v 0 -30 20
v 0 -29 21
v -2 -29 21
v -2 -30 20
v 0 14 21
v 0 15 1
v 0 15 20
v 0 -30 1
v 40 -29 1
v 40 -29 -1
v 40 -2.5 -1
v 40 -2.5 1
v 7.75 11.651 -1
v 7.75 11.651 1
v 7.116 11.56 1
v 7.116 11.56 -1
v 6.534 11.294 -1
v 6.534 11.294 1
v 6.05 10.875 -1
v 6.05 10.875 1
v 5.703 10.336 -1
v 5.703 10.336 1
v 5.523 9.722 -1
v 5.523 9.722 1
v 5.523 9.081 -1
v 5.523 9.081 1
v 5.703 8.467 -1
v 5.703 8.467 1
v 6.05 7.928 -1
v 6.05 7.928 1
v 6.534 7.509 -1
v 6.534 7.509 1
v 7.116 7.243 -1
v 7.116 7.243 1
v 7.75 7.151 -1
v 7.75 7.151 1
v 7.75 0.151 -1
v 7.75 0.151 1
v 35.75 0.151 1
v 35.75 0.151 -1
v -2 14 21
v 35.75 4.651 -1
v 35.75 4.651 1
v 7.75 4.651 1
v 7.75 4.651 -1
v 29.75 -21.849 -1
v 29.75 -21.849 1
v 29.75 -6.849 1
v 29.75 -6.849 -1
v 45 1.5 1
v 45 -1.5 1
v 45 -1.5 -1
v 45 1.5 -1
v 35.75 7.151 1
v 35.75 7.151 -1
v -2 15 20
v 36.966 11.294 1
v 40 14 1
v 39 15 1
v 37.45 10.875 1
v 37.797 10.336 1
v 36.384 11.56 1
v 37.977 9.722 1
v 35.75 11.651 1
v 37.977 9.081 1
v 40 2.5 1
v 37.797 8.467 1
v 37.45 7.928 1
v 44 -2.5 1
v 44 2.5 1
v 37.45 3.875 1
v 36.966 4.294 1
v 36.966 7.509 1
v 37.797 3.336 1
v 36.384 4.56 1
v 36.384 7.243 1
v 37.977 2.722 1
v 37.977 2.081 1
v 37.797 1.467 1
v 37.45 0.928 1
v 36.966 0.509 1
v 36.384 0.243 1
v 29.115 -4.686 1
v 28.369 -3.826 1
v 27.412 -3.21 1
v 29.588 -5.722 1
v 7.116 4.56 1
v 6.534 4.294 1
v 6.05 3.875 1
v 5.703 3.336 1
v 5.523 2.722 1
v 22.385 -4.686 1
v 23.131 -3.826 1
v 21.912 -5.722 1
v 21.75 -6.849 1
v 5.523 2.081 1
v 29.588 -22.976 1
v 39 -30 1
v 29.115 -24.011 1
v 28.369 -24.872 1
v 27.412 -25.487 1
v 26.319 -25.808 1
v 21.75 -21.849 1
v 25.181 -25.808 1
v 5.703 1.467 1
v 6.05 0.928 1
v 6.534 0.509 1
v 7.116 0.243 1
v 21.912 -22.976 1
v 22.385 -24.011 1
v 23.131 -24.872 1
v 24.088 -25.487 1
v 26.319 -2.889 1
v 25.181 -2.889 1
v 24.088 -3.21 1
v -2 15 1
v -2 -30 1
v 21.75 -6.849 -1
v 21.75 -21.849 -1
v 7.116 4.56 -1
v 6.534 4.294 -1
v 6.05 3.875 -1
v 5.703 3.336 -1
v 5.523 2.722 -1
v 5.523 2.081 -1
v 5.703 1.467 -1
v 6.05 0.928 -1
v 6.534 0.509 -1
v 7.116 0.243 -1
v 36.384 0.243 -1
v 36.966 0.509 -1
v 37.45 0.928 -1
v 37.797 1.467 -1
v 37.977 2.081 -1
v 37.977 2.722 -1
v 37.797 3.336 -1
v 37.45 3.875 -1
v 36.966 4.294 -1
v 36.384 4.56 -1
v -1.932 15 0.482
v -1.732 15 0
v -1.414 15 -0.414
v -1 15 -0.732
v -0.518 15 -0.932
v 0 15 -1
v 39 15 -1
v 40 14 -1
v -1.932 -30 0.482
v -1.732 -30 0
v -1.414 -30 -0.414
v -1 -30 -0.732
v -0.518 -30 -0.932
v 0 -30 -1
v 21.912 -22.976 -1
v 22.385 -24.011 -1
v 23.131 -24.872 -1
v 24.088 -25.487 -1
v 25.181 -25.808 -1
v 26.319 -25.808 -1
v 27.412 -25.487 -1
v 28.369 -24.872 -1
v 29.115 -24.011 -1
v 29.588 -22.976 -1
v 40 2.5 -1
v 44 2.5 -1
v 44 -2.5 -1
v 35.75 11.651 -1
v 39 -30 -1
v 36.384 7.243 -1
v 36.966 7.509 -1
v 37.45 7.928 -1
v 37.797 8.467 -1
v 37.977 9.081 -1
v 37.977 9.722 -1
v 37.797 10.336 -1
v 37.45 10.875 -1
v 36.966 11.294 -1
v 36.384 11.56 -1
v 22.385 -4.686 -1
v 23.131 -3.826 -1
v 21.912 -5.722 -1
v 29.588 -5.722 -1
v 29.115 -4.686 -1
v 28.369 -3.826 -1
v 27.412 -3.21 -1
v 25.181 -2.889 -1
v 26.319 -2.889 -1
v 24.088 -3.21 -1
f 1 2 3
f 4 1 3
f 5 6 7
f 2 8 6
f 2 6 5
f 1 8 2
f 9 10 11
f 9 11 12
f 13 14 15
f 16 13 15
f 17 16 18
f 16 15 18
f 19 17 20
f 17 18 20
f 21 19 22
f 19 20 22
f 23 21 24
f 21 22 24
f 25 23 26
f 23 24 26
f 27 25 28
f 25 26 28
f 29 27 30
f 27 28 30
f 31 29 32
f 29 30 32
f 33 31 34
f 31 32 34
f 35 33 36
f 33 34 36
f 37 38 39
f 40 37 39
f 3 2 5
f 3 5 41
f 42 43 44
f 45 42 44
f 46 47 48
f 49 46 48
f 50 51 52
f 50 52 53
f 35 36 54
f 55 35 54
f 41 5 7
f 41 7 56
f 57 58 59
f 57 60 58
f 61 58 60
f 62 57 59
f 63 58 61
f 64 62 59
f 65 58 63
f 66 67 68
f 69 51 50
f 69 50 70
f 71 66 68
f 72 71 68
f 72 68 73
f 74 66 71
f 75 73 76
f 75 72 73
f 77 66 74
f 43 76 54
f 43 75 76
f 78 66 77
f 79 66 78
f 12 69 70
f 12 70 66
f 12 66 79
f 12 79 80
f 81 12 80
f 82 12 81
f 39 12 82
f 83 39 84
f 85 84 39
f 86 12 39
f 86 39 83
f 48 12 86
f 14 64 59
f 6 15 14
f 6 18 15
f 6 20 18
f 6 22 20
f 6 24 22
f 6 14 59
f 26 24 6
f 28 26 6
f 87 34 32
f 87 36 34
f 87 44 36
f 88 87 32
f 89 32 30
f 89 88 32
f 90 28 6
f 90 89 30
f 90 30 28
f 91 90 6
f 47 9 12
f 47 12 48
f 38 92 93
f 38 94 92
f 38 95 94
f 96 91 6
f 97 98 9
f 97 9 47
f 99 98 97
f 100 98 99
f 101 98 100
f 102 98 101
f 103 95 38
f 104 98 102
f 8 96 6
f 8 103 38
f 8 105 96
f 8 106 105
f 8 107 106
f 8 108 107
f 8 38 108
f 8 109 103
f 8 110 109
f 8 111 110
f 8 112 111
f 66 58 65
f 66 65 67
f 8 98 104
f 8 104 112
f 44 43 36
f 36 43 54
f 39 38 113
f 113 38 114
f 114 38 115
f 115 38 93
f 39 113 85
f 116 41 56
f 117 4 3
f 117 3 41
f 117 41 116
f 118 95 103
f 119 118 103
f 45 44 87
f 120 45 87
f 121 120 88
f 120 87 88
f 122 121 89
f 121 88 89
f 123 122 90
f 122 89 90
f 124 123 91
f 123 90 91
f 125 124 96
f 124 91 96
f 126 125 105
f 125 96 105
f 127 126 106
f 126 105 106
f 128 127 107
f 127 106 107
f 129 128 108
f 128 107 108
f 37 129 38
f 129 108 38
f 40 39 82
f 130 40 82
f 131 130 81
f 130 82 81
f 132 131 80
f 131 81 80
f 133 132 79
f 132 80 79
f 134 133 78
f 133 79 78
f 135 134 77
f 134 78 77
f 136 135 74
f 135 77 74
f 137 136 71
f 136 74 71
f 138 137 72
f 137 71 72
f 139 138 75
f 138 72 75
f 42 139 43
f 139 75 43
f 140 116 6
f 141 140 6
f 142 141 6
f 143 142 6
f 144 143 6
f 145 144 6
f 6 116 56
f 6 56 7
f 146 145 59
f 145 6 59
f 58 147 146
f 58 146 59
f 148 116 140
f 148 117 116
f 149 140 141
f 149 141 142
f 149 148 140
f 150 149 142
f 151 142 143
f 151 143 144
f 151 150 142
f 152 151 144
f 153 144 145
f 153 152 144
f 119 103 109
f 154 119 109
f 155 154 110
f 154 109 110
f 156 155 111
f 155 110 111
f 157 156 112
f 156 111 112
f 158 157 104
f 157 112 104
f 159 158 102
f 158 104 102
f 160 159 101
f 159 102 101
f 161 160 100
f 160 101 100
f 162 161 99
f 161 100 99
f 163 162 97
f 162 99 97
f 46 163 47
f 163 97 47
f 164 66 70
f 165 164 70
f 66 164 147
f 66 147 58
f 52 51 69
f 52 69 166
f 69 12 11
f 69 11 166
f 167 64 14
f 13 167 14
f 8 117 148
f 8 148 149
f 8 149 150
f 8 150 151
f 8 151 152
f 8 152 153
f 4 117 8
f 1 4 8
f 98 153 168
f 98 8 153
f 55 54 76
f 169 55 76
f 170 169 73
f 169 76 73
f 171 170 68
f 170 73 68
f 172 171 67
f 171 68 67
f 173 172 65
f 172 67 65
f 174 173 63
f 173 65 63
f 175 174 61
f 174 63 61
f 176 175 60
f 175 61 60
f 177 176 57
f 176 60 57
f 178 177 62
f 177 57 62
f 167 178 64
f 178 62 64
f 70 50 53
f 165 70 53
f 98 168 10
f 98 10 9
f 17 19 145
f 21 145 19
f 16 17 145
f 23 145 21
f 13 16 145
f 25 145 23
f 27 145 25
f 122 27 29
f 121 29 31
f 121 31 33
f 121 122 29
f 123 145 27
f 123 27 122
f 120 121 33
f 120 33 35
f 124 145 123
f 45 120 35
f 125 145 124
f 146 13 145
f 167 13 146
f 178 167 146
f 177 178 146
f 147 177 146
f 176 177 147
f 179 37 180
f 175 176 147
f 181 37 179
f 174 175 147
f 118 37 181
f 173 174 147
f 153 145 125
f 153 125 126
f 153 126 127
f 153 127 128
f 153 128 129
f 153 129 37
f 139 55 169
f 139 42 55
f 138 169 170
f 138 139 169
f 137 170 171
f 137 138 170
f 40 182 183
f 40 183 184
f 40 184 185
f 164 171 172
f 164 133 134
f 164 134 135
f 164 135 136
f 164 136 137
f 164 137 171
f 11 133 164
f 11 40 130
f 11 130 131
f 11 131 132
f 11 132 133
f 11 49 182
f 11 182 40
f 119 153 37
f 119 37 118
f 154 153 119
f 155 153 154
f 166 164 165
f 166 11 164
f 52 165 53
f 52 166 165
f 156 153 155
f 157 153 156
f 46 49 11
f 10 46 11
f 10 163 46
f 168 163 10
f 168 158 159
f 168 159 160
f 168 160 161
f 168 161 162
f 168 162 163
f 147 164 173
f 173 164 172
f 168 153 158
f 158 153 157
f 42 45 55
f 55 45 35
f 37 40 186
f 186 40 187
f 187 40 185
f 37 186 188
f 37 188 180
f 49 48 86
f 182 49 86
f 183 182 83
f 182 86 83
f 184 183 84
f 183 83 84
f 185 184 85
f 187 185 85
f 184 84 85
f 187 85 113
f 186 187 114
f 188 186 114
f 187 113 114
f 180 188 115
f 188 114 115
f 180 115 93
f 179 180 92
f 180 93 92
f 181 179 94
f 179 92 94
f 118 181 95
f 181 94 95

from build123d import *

# Parameters (mm, degrees)
F1_DEPTH      = 30
F1_DEPTH_BACK = 15
F3_DEPTH      = 25
F4_W          = 5
F4_H          = 5
F5_DEPTH      = 2
F6_SIZE2      = 1
F6_SIZE       = 1


with BuildPart() as f1:
    # F0 (on Front) → F1 (new body, two sides)
    with BuildSketch(Plane.XZ) as f1_sk:
        with BuildLine():
            Line((0, -1), (40, -1))
            Line((40, -1), (40, 1))
            Line((40, 1), (0, 1))
            Line((0, 1), (0, 21))
            Line((0, 21), (-2, 21))
            Line((-2, 21), (-2, 1))
            ThreePointArc((-2, 1), (-1.414214, -0.414214), (0, -1))
        make_face()
    extrude(amount=F1_DEPTH)
    extrude(f1_sk.sketch, amount=-F1_DEPTH_BACK)

    # F2 (on face) → F3 (cut)
    with BuildSketch(Plane.XY.offset(1)):
        with BuildLine():
            Line((35.75, 11.651385), (7.75, 11.651385))
            ThreePointArc((7.75, 11.651385), (5.5, 9.401385), (7.75, 7.151385))
            Line((7.75, 7.151385), (35.75, 7.151385))
            ThreePointArc((35.75, 7.151385), (38, 9.401385), (35.75, 11.651385))
        make_face()
        with BuildLine():
            Line((21.75, -6.848615), (21.75, -21.848615))
            ThreePointArc((21.75, -21.848615), (25.75, -25.848615), (29.75, -21.848615))
            Line((29.75, -21.848615), (29.75, -6.848615))
            ThreePointArc((29.75, -6.848615), (25.75, -2.848615), (21.75, -6.848615))
        make_face()
        with BuildLine():
            Line((35.75, 4.651385), (7.75, 4.651385))
            ThreePointArc((7.75, 4.651385), (5.5, 2.401385), (7.75, 0.151385))
            Line((7.75, 0.151385), (35.75, 0.151385))
            ThreePointArc((35.75, 0.151385), (38, 2.401385), (35.75, 4.651385))
        make_face()
    extrude(amount=-F3_DEPTH, mode=Mode.SUBTRACT)

    # F4 (on face) → F5 (join, through all)
    with BuildSketch(Plane.XY.offset(1)):
        with Locations((42.5, 0)):
            Rectangle(F4_W, F4_H)
    extrude(amount=-F5_DEPTH)

    # F6
    f6_edges = [f1.edges().sort_by_distance(p)[0] for p in [
        (-1, 15, 21),
        (-1, -30, 21),
        (40, -30, 0),
        (40, 15, 0),
        (45, 2.5, 0),
        (45, -2.5, 0),
    ]]
    chamfer(f6_edges, length=F6_SIZE, length2=F6_SIZE2)


solid = f1.part
